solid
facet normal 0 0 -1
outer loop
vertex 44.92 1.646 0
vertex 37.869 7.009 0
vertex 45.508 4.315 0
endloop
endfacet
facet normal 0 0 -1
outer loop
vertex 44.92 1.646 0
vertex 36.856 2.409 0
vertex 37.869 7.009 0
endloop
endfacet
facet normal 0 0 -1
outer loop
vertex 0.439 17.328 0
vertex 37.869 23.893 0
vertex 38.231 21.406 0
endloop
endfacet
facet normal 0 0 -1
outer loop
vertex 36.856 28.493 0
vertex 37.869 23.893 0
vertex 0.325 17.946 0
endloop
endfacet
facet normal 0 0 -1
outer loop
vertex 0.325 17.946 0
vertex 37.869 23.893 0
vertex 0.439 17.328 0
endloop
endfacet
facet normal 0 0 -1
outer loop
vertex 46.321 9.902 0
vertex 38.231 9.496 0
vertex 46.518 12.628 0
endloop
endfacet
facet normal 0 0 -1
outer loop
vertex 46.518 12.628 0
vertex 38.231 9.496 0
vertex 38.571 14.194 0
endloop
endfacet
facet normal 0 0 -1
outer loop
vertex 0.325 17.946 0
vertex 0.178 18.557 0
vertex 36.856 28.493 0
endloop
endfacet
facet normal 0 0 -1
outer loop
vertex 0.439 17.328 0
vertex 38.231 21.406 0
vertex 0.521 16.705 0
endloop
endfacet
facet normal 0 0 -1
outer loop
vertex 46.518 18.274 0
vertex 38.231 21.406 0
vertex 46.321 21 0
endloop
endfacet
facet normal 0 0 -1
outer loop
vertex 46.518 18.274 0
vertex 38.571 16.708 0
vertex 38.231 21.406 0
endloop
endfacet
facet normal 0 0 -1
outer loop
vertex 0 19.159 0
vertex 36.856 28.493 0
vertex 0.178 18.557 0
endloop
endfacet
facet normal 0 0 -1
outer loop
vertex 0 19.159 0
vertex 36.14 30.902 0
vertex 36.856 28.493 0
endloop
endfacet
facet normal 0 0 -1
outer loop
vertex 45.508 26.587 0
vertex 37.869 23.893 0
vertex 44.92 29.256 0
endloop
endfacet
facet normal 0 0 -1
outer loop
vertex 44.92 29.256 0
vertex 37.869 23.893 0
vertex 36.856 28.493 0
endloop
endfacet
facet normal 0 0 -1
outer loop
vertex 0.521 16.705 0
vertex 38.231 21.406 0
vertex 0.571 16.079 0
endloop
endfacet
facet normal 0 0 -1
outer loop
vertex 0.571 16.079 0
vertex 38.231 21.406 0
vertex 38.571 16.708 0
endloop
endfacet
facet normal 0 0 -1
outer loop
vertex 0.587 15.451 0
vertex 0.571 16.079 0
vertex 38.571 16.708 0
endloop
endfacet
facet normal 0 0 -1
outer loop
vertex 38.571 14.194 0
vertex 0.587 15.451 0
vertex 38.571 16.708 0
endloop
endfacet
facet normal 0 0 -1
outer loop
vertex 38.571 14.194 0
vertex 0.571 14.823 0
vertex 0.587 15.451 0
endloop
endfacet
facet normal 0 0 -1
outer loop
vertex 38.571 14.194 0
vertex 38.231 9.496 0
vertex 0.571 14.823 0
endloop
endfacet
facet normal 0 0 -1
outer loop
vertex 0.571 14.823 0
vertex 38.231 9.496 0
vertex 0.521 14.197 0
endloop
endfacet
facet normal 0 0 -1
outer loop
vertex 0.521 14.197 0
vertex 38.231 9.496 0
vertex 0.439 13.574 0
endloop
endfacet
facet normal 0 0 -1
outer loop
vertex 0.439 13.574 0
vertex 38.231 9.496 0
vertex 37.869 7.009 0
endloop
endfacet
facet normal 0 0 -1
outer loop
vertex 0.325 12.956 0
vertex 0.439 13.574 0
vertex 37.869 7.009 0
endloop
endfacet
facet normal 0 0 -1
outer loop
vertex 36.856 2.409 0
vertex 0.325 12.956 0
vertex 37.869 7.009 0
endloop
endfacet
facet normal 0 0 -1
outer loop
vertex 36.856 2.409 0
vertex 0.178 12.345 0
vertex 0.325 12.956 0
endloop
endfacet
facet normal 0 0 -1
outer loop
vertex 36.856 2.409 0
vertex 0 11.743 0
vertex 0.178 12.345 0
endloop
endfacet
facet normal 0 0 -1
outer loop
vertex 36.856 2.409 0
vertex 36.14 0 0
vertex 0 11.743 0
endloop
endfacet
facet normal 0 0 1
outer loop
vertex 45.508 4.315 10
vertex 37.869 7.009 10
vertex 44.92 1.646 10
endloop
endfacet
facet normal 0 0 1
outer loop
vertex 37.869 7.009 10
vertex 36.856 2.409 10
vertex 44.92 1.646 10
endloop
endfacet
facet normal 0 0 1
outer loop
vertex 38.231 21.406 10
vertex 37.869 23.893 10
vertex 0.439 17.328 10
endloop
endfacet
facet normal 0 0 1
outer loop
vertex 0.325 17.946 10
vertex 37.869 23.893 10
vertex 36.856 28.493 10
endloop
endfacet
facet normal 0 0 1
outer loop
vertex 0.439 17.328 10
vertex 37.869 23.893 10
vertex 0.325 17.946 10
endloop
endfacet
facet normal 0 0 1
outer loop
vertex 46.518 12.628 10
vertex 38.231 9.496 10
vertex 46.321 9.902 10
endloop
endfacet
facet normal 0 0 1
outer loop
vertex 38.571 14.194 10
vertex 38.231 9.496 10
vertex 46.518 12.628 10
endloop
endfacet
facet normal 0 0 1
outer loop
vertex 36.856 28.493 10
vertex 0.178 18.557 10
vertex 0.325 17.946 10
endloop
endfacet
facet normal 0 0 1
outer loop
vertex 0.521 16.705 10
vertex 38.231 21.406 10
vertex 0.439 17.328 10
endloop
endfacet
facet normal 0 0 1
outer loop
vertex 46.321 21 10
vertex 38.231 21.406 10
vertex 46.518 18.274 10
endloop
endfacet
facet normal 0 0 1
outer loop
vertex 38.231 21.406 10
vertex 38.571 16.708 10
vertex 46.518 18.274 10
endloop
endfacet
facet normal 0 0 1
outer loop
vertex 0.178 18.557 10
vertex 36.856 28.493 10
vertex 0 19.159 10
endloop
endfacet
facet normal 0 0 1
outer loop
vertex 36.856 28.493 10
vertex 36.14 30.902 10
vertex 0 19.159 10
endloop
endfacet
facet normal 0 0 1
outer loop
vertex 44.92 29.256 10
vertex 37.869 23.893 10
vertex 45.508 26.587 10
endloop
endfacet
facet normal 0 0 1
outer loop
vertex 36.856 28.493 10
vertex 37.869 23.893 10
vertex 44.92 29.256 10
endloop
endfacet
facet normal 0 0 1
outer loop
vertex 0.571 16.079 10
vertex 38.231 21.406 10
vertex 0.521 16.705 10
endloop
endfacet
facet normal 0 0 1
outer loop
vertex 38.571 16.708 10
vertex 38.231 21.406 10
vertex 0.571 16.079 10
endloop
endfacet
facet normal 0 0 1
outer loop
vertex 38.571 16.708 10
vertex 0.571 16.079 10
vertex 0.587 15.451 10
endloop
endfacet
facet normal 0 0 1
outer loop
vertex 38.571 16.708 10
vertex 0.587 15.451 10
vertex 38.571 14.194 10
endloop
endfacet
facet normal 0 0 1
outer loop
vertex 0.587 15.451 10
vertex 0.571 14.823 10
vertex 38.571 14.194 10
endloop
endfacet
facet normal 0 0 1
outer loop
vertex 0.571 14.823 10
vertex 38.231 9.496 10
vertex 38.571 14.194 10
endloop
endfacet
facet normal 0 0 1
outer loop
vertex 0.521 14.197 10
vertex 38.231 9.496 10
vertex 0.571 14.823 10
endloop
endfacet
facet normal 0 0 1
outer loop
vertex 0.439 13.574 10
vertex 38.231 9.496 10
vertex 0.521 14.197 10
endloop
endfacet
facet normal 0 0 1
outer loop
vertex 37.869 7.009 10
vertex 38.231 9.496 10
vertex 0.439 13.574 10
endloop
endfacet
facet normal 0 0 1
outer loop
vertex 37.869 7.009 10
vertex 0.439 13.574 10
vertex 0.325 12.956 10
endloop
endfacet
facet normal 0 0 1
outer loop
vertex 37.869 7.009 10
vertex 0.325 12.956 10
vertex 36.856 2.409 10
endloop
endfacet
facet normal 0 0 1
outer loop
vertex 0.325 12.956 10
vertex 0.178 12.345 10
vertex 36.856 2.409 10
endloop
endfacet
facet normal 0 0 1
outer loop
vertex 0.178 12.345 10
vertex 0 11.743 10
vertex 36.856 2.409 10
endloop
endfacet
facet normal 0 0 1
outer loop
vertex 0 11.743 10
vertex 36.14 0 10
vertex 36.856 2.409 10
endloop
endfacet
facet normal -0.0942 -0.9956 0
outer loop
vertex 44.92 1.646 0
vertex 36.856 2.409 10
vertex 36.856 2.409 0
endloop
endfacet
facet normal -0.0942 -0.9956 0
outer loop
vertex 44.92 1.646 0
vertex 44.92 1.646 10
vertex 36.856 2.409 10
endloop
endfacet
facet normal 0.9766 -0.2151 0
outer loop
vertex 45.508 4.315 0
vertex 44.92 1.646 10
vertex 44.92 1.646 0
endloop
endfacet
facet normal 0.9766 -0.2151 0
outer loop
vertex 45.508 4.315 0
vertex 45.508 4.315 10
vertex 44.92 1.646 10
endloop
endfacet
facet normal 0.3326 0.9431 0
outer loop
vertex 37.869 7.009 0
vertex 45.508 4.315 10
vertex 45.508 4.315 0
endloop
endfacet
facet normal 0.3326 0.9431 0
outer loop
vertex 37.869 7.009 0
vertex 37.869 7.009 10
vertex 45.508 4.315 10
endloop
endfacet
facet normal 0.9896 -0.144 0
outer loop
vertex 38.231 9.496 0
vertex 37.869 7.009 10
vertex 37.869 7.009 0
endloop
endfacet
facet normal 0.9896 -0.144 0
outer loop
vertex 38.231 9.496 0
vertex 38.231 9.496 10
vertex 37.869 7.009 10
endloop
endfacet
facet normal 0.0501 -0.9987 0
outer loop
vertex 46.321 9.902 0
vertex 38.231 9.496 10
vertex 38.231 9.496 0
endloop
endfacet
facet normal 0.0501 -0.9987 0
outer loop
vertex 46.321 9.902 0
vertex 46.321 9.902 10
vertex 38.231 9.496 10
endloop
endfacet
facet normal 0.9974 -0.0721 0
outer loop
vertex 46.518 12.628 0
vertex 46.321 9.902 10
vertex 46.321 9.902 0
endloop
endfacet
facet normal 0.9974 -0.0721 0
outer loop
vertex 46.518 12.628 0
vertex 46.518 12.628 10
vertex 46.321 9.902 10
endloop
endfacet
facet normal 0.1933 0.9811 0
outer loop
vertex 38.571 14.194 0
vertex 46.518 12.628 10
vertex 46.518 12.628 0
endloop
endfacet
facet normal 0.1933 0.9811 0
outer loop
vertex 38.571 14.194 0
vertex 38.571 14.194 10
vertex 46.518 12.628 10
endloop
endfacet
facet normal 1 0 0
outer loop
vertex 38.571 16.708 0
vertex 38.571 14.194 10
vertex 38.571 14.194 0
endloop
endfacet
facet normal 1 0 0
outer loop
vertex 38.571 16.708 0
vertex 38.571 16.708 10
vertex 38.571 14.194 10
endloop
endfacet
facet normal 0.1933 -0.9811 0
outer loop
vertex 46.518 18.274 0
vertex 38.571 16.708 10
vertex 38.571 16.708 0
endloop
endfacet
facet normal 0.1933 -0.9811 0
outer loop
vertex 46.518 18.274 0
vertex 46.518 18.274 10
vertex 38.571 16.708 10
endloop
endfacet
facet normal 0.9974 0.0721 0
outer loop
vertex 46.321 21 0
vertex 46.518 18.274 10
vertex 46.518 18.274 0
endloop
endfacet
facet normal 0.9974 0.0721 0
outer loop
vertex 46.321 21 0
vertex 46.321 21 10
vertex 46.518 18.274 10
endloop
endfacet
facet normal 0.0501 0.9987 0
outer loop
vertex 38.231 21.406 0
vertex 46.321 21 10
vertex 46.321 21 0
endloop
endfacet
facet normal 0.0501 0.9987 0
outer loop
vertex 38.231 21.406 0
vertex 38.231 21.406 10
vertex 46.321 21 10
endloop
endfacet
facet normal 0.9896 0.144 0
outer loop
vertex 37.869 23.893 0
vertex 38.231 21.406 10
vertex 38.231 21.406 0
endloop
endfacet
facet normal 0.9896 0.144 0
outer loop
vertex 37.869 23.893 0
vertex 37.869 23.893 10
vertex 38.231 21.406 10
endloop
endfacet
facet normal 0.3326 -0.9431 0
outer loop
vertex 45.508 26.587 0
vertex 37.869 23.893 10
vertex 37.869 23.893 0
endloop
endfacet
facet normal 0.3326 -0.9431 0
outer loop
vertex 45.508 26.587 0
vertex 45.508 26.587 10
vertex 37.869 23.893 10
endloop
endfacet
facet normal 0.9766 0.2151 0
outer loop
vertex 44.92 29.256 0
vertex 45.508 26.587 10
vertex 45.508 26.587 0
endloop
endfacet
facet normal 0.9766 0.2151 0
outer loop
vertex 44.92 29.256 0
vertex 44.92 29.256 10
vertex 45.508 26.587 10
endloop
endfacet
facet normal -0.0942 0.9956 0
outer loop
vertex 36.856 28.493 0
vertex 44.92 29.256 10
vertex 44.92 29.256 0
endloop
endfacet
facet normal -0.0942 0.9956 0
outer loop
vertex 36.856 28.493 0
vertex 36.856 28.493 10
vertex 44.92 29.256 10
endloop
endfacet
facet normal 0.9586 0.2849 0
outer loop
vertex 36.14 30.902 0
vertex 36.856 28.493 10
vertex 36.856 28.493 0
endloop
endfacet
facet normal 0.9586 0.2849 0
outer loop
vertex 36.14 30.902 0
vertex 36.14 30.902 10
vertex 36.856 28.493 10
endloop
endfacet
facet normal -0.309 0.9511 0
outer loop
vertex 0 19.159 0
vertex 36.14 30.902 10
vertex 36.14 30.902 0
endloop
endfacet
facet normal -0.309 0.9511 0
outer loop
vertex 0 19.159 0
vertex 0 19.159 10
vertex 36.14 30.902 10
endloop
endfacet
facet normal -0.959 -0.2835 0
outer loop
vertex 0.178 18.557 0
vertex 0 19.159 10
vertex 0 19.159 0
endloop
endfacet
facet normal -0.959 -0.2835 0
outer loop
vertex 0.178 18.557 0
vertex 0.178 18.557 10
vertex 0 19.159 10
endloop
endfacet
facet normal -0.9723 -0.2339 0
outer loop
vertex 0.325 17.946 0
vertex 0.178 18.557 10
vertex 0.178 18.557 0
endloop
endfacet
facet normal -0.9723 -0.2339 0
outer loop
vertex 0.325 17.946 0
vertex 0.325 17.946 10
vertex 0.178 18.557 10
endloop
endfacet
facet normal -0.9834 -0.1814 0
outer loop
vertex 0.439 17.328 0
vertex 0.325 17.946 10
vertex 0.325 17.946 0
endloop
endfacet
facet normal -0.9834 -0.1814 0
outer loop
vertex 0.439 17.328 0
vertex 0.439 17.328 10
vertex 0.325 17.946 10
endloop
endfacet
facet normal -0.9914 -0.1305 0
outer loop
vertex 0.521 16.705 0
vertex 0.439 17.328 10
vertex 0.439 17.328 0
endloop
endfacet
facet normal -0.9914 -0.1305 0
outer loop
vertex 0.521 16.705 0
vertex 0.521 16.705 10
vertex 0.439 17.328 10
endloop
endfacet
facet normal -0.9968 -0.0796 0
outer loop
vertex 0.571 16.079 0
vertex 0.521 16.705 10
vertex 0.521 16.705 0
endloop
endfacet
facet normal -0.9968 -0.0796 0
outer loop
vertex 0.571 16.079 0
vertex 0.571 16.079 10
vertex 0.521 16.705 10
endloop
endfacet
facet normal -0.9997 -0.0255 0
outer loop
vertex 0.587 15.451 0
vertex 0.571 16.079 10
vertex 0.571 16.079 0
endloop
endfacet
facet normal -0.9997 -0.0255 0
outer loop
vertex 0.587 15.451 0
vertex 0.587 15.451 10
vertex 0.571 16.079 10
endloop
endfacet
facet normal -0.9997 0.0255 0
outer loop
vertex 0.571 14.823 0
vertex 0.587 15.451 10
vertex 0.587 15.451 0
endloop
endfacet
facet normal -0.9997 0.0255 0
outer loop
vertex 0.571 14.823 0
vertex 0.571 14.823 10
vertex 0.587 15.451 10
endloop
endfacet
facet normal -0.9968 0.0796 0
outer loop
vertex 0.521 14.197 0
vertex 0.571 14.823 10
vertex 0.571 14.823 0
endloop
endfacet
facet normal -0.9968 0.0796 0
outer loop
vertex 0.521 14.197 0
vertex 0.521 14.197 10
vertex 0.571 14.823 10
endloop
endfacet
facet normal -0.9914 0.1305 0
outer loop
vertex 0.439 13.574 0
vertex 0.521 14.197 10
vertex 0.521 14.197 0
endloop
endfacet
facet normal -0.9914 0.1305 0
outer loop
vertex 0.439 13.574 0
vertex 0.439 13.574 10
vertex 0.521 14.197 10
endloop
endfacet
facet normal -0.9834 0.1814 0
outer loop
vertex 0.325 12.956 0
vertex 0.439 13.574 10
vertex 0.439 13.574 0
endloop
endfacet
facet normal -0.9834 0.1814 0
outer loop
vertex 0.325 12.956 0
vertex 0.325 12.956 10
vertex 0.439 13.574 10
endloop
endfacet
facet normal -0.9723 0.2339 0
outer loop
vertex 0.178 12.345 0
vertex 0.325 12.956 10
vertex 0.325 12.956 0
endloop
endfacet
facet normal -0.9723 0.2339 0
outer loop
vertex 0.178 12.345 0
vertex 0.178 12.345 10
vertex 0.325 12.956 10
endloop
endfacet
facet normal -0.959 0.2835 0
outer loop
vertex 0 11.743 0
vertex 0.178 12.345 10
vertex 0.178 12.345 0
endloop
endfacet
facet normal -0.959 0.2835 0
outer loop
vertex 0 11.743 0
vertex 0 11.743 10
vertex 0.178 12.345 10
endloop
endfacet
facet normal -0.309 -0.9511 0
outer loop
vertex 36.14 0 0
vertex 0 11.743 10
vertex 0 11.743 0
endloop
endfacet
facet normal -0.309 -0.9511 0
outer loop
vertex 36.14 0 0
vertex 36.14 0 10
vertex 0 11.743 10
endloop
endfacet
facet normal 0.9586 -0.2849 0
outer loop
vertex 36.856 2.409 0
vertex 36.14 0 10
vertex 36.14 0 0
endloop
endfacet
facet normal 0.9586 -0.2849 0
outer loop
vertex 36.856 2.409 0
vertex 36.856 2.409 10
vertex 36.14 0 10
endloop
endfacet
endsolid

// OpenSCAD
$fn = 32;

// ----------------------------------------------------------------------
// Gear sector: 4 teeth on 36 degrees
// ----------------------------------------------------------------------

// --- parameters (mm) ---
sector_angle = 36;        // sector angle, degrees
root_r = 50;              // root circle radius
tooth_h = 8;              // tooth height over the root circle
teeth = 4;                // number of teeth on the sector
hub_r = 12;               // hub bore radius
plate_t = 10;             // sector thickness, Z
arc_step = 3;             // sampling step of the root/hub arcs, degrees

tip_r = root_r + tooth_h;  // tip circle radius

profile = [[36.14, 0], [36.856, 2.409], [44.92, 1.646], [45.508, 4.315], [37.869, 7.009], [38.231, 9.496], [46.321, 9.902], [46.518, 12.628], [38.571, 14.194], [38.571, 16.708], [46.518, 18.274], [46.321, 21], [38.231, 21.406], [37.869, 23.893], [45.508, 26.587], [44.92, 29.256], [36.856, 28.493], [36.14, 30.902], [0, 19.159], [0.178, 18.557], [0.325, 17.946], [0.439, 17.328], [0.521, 16.705], [0.571, 16.079], [0.587, 15.451], [0.571, 14.823], [0.521, 14.197], [0.439, 13.574], [0.325, 12.956], [0.178, 12.345], [0, 11.743]];  // primary outline, 31 points, counter clockwise

// --- the one profile operation ---
linear_extrude(height = plate_t) polygon(points = profile);
